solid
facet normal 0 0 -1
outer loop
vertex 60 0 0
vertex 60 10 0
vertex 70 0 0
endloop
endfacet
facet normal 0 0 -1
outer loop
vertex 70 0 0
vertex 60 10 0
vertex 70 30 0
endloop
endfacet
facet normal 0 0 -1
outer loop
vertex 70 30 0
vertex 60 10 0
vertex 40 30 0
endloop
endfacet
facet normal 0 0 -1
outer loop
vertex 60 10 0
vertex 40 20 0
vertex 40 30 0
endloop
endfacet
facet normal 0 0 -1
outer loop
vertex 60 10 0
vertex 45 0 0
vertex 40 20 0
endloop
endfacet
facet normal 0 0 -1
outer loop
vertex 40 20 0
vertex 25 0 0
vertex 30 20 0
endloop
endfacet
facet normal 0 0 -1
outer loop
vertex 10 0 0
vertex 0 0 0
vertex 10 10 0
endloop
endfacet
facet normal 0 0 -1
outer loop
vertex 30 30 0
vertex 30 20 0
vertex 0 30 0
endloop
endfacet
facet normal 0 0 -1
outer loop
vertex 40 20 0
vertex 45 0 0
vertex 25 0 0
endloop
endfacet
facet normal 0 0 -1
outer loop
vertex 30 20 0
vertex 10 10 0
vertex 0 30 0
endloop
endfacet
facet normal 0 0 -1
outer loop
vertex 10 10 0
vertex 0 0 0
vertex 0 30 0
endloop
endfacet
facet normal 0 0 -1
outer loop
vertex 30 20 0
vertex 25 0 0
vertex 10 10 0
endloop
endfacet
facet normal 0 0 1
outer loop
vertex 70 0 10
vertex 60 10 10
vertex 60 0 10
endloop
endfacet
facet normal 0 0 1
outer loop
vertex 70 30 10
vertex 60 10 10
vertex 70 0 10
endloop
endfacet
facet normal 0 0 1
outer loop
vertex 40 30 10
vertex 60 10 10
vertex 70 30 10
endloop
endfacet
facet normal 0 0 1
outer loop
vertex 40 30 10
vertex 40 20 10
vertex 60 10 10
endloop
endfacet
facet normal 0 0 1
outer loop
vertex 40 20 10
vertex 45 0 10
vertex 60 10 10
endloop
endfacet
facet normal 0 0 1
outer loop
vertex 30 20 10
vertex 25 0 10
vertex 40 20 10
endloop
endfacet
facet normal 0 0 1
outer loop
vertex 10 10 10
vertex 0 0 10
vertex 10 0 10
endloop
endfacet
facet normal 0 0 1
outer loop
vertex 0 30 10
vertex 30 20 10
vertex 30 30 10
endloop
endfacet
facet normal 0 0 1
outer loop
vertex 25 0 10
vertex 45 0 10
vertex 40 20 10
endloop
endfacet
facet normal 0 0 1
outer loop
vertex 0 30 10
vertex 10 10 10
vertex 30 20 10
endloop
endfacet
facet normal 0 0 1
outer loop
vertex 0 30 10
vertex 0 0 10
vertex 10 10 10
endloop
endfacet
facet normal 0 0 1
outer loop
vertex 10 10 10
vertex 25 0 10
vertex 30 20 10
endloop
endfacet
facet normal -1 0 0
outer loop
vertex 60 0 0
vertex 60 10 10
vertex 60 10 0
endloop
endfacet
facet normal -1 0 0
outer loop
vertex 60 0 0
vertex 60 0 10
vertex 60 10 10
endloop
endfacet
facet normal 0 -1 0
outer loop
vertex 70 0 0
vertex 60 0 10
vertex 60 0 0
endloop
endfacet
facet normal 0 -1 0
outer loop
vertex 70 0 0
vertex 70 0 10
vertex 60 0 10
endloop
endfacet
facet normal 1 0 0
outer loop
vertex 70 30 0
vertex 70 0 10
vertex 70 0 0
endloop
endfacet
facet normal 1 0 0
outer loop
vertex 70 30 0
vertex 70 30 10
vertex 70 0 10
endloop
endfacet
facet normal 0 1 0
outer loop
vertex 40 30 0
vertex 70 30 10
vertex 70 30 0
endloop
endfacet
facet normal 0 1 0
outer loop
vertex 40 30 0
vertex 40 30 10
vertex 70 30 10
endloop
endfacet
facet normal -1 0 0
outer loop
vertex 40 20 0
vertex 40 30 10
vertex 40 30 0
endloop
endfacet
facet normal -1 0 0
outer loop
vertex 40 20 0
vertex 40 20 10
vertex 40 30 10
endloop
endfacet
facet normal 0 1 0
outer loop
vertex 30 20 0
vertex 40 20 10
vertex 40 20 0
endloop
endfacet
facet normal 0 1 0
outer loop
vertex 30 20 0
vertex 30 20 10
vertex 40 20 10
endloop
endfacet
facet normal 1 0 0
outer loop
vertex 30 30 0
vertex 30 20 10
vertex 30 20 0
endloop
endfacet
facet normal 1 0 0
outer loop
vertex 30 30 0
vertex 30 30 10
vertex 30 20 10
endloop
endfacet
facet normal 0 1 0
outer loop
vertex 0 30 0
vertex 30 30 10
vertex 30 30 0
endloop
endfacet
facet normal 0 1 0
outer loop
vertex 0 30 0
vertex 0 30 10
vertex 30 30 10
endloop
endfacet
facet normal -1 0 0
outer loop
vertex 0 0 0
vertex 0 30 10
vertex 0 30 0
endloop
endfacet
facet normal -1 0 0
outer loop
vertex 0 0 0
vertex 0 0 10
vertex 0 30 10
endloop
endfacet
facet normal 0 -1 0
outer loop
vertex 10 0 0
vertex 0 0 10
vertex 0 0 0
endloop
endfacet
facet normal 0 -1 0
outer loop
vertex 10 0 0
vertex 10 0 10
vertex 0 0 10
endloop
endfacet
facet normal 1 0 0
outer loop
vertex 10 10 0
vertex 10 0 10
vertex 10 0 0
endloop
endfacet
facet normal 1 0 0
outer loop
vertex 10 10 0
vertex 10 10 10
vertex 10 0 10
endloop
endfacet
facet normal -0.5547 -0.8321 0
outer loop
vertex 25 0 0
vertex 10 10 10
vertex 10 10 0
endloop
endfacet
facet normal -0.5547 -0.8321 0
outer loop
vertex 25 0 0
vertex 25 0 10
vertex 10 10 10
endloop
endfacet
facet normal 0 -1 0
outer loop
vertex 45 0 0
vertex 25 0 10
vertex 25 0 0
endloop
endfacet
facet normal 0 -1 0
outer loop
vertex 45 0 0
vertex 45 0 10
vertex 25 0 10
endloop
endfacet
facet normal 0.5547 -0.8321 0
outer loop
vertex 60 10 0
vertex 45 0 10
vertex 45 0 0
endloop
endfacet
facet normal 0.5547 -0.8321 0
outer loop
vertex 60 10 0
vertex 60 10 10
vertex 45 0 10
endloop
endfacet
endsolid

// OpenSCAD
//puntos
p0 = [0, 0];
p1 = [0, 30];
p2 = [30, 30];
p3 = [30, 20];
p4 = [35, 20];
p5 = [35, 0];
p6 = [25, 0];
p7 = [10,10];
p8 = [10,0];
points = [p0, p1, p2, p3,p4, p5,p6,p7,p8];


linear_extrude(10){
    union(){
    polygon(points);

    translate([70,0,0])
    mirror(){
    polygon(points);
    }
}
}
